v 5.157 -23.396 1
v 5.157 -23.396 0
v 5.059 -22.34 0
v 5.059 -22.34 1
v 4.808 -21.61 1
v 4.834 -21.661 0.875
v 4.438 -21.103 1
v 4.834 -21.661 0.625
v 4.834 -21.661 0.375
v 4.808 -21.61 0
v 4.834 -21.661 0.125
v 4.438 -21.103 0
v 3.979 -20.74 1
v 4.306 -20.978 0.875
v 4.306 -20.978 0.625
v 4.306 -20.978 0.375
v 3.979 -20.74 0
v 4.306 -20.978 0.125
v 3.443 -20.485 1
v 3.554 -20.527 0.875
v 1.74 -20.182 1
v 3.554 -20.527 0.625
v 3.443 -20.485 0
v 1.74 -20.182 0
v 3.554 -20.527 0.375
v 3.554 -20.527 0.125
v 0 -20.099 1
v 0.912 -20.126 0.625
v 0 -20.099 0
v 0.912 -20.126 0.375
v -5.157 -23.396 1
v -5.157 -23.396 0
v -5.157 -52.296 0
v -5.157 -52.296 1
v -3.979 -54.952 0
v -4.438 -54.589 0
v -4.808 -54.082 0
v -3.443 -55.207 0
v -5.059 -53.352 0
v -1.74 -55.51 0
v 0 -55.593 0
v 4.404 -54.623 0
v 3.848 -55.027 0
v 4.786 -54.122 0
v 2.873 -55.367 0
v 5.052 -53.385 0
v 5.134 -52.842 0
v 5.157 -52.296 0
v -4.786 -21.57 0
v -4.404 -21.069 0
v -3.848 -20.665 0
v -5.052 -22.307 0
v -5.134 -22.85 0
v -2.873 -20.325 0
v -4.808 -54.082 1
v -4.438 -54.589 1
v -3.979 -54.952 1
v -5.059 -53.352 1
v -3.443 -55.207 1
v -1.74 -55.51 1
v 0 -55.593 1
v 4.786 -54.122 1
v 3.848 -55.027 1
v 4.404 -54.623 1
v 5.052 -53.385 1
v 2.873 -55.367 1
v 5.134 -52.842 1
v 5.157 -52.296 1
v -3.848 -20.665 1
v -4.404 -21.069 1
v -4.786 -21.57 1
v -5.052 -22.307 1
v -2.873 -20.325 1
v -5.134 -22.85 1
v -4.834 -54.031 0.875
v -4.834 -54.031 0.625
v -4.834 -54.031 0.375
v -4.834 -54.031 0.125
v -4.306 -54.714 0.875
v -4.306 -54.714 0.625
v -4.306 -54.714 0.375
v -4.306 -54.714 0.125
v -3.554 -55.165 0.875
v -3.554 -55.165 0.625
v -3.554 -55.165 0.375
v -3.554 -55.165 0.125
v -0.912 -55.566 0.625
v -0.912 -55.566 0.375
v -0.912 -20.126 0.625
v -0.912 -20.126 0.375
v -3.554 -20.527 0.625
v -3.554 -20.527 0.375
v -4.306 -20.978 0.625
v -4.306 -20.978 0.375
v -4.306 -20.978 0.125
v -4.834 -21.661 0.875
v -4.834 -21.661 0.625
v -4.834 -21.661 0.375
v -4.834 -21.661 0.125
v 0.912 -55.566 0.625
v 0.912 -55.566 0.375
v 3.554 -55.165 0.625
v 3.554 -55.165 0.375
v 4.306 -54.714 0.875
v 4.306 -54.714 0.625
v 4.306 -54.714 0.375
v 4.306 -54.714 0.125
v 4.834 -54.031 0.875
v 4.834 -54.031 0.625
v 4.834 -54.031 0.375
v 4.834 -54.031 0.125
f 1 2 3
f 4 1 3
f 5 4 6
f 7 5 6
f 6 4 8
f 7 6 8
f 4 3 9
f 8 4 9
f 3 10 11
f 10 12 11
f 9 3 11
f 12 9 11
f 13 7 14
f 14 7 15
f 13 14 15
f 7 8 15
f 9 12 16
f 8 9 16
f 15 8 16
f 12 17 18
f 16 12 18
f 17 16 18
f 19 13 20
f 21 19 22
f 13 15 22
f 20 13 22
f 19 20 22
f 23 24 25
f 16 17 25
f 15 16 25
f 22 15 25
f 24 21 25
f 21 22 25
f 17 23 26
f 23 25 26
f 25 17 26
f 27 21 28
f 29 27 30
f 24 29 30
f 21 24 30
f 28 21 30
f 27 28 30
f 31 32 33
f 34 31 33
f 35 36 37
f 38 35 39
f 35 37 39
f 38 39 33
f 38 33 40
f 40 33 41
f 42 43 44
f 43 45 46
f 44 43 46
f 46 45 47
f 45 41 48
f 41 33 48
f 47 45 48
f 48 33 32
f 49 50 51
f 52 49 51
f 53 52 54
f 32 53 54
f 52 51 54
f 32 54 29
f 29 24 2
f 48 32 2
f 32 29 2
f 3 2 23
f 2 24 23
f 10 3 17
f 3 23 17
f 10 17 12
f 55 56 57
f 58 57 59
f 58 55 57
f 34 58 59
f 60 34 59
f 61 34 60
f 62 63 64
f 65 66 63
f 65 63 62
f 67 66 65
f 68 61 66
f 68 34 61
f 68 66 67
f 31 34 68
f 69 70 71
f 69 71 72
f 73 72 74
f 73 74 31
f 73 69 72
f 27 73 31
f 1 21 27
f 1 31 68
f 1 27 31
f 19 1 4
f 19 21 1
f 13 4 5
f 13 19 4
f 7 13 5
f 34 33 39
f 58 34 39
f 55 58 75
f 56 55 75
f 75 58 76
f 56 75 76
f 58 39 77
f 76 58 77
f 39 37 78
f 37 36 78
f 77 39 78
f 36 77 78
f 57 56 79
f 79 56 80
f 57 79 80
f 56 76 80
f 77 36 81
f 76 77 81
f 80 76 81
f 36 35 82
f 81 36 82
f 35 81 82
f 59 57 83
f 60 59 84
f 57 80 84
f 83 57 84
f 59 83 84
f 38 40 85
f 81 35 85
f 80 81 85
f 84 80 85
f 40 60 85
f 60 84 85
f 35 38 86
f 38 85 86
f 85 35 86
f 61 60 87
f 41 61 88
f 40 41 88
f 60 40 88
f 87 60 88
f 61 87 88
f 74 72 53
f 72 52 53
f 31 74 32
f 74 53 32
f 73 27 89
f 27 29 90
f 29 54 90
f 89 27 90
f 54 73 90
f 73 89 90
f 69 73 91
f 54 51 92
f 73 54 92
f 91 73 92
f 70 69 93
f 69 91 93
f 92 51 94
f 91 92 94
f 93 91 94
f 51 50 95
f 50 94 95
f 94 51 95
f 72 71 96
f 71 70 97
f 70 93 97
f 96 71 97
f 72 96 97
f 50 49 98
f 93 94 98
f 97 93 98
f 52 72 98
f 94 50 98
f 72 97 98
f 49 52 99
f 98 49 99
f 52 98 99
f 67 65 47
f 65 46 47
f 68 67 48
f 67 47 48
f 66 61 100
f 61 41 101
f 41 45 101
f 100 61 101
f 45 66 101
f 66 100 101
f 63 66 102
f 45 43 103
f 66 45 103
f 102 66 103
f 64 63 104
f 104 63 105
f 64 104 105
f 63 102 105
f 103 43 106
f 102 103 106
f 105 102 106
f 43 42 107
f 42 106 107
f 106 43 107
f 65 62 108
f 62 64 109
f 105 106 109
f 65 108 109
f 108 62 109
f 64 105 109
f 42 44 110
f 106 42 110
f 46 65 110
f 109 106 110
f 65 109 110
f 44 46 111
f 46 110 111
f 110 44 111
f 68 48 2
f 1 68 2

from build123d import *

# Parameters (mm, degrees)
EXTRUDE_1_DEPTH = 1


with BuildPart() as part:
    # 草图1 → 凸台-拉伸1 (new body)
    with BuildSketch(Plane.XY):
        with BuildLine():
            Line((-5.156513066, -23.395653078), (-5.156513076, -52.29634699))
            add(Edge.make_bspline(
                [(-5.156513076, -52.29634699), (-5.156513076, -52.592023575), (-5.121946258, -53.18119242), (-4.883623314, -54.063457093), (-4.345616159, -54.753929213), (-3.309929308, -55.353177735), (-2.096186503, -55.489977412), (-1.054536008, -55.5595988), (-0.477806475, -55.587346335), (-0.156548342, -55.59289984), (-6.7e-08, -55.592882672)],
                knots=[0, 0, 0, 0, 0.125000173, 0.250000346, 0.375000519, 0.500000692, 0.750001038, 0.875001211, 0.937501298, 1.000001384, 1.000001384, 1.000001384, 1.000001384], degree=3))
            add(Edge.make_bspline(
                [(-6.7e-08, -55.592882672), (0.156548209, -55.59289984), (0.477806342, -55.587346335), (1.054535874, -55.5595988), (2.09618637, -55.489977413), (3.309929175, -55.353177737), (4.345616026, -54.753929216), (4.883623182, -54.063457096), (5.121946126, -53.181192423), (5.156512945, -52.592023578), (5.156512945, -52.296346994)],
                knots=[-1.384e-06, -1.384e-06, -1.384e-06, -1.384e-06, 0.062498702, 0.124998789, 0.249998962, 0.499999308, 0.624999481, 0.749999654, 0.874999827, 1, 1, 1, 1], degree=3))
            Line((5.156512945, -52.296346994), (5.156512955, -23.395653081))
            add(Edge.make_bspline(
                [(5.156512955, -23.395653081), (5.156512955, -23.099976497), (5.121946137, -22.510807652), (4.883623193, -21.628542979), (4.345616038, -20.938070858), (3.309929187, -20.338822336), (2.096186382, -20.20202266), (1.054535887, -20.132401272), (0.477806354, -20.104653737), (0.156548221, -20.099100231), (-5.4e-08, -20.0991174)],
                knots=[0, 0, 0, 0, 0.125000173, 0.250000346, 0.375000519, 0.500000692, 0.750001038, 0.875001211, 0.937501298, 1.000001384, 1.000001384, 1.000001384, 1.000001384], degree=3))
            add(Edge.make_bspline(
                [(-5.4e-08, -20.0991174), (-0.15654833, -20.099100231), (-0.477806463, -20.104653736), (-1.054535995, -20.132401271), (-2.096186491, -20.202022658), (-3.309929296, -20.338822334), (-4.345616147, -20.938070855), (-4.883623303, -21.628542975), (-5.121946247, -22.510807648), (-5.156513066, -23.099976493), (-5.156513066, -23.395653078)],
                knots=[-1.384e-06, -1.384e-06, -1.384e-06, -1.384e-06, 0.062498702, 0.124998789, 0.249998962, 0.499999308, 0.624999481, 0.749999654, 0.874999827, 1, 1, 1, 1], degree=3))
        make_face()
    extrude(amount=EXTRUDE_1_DEPTH)


solid = part.part
